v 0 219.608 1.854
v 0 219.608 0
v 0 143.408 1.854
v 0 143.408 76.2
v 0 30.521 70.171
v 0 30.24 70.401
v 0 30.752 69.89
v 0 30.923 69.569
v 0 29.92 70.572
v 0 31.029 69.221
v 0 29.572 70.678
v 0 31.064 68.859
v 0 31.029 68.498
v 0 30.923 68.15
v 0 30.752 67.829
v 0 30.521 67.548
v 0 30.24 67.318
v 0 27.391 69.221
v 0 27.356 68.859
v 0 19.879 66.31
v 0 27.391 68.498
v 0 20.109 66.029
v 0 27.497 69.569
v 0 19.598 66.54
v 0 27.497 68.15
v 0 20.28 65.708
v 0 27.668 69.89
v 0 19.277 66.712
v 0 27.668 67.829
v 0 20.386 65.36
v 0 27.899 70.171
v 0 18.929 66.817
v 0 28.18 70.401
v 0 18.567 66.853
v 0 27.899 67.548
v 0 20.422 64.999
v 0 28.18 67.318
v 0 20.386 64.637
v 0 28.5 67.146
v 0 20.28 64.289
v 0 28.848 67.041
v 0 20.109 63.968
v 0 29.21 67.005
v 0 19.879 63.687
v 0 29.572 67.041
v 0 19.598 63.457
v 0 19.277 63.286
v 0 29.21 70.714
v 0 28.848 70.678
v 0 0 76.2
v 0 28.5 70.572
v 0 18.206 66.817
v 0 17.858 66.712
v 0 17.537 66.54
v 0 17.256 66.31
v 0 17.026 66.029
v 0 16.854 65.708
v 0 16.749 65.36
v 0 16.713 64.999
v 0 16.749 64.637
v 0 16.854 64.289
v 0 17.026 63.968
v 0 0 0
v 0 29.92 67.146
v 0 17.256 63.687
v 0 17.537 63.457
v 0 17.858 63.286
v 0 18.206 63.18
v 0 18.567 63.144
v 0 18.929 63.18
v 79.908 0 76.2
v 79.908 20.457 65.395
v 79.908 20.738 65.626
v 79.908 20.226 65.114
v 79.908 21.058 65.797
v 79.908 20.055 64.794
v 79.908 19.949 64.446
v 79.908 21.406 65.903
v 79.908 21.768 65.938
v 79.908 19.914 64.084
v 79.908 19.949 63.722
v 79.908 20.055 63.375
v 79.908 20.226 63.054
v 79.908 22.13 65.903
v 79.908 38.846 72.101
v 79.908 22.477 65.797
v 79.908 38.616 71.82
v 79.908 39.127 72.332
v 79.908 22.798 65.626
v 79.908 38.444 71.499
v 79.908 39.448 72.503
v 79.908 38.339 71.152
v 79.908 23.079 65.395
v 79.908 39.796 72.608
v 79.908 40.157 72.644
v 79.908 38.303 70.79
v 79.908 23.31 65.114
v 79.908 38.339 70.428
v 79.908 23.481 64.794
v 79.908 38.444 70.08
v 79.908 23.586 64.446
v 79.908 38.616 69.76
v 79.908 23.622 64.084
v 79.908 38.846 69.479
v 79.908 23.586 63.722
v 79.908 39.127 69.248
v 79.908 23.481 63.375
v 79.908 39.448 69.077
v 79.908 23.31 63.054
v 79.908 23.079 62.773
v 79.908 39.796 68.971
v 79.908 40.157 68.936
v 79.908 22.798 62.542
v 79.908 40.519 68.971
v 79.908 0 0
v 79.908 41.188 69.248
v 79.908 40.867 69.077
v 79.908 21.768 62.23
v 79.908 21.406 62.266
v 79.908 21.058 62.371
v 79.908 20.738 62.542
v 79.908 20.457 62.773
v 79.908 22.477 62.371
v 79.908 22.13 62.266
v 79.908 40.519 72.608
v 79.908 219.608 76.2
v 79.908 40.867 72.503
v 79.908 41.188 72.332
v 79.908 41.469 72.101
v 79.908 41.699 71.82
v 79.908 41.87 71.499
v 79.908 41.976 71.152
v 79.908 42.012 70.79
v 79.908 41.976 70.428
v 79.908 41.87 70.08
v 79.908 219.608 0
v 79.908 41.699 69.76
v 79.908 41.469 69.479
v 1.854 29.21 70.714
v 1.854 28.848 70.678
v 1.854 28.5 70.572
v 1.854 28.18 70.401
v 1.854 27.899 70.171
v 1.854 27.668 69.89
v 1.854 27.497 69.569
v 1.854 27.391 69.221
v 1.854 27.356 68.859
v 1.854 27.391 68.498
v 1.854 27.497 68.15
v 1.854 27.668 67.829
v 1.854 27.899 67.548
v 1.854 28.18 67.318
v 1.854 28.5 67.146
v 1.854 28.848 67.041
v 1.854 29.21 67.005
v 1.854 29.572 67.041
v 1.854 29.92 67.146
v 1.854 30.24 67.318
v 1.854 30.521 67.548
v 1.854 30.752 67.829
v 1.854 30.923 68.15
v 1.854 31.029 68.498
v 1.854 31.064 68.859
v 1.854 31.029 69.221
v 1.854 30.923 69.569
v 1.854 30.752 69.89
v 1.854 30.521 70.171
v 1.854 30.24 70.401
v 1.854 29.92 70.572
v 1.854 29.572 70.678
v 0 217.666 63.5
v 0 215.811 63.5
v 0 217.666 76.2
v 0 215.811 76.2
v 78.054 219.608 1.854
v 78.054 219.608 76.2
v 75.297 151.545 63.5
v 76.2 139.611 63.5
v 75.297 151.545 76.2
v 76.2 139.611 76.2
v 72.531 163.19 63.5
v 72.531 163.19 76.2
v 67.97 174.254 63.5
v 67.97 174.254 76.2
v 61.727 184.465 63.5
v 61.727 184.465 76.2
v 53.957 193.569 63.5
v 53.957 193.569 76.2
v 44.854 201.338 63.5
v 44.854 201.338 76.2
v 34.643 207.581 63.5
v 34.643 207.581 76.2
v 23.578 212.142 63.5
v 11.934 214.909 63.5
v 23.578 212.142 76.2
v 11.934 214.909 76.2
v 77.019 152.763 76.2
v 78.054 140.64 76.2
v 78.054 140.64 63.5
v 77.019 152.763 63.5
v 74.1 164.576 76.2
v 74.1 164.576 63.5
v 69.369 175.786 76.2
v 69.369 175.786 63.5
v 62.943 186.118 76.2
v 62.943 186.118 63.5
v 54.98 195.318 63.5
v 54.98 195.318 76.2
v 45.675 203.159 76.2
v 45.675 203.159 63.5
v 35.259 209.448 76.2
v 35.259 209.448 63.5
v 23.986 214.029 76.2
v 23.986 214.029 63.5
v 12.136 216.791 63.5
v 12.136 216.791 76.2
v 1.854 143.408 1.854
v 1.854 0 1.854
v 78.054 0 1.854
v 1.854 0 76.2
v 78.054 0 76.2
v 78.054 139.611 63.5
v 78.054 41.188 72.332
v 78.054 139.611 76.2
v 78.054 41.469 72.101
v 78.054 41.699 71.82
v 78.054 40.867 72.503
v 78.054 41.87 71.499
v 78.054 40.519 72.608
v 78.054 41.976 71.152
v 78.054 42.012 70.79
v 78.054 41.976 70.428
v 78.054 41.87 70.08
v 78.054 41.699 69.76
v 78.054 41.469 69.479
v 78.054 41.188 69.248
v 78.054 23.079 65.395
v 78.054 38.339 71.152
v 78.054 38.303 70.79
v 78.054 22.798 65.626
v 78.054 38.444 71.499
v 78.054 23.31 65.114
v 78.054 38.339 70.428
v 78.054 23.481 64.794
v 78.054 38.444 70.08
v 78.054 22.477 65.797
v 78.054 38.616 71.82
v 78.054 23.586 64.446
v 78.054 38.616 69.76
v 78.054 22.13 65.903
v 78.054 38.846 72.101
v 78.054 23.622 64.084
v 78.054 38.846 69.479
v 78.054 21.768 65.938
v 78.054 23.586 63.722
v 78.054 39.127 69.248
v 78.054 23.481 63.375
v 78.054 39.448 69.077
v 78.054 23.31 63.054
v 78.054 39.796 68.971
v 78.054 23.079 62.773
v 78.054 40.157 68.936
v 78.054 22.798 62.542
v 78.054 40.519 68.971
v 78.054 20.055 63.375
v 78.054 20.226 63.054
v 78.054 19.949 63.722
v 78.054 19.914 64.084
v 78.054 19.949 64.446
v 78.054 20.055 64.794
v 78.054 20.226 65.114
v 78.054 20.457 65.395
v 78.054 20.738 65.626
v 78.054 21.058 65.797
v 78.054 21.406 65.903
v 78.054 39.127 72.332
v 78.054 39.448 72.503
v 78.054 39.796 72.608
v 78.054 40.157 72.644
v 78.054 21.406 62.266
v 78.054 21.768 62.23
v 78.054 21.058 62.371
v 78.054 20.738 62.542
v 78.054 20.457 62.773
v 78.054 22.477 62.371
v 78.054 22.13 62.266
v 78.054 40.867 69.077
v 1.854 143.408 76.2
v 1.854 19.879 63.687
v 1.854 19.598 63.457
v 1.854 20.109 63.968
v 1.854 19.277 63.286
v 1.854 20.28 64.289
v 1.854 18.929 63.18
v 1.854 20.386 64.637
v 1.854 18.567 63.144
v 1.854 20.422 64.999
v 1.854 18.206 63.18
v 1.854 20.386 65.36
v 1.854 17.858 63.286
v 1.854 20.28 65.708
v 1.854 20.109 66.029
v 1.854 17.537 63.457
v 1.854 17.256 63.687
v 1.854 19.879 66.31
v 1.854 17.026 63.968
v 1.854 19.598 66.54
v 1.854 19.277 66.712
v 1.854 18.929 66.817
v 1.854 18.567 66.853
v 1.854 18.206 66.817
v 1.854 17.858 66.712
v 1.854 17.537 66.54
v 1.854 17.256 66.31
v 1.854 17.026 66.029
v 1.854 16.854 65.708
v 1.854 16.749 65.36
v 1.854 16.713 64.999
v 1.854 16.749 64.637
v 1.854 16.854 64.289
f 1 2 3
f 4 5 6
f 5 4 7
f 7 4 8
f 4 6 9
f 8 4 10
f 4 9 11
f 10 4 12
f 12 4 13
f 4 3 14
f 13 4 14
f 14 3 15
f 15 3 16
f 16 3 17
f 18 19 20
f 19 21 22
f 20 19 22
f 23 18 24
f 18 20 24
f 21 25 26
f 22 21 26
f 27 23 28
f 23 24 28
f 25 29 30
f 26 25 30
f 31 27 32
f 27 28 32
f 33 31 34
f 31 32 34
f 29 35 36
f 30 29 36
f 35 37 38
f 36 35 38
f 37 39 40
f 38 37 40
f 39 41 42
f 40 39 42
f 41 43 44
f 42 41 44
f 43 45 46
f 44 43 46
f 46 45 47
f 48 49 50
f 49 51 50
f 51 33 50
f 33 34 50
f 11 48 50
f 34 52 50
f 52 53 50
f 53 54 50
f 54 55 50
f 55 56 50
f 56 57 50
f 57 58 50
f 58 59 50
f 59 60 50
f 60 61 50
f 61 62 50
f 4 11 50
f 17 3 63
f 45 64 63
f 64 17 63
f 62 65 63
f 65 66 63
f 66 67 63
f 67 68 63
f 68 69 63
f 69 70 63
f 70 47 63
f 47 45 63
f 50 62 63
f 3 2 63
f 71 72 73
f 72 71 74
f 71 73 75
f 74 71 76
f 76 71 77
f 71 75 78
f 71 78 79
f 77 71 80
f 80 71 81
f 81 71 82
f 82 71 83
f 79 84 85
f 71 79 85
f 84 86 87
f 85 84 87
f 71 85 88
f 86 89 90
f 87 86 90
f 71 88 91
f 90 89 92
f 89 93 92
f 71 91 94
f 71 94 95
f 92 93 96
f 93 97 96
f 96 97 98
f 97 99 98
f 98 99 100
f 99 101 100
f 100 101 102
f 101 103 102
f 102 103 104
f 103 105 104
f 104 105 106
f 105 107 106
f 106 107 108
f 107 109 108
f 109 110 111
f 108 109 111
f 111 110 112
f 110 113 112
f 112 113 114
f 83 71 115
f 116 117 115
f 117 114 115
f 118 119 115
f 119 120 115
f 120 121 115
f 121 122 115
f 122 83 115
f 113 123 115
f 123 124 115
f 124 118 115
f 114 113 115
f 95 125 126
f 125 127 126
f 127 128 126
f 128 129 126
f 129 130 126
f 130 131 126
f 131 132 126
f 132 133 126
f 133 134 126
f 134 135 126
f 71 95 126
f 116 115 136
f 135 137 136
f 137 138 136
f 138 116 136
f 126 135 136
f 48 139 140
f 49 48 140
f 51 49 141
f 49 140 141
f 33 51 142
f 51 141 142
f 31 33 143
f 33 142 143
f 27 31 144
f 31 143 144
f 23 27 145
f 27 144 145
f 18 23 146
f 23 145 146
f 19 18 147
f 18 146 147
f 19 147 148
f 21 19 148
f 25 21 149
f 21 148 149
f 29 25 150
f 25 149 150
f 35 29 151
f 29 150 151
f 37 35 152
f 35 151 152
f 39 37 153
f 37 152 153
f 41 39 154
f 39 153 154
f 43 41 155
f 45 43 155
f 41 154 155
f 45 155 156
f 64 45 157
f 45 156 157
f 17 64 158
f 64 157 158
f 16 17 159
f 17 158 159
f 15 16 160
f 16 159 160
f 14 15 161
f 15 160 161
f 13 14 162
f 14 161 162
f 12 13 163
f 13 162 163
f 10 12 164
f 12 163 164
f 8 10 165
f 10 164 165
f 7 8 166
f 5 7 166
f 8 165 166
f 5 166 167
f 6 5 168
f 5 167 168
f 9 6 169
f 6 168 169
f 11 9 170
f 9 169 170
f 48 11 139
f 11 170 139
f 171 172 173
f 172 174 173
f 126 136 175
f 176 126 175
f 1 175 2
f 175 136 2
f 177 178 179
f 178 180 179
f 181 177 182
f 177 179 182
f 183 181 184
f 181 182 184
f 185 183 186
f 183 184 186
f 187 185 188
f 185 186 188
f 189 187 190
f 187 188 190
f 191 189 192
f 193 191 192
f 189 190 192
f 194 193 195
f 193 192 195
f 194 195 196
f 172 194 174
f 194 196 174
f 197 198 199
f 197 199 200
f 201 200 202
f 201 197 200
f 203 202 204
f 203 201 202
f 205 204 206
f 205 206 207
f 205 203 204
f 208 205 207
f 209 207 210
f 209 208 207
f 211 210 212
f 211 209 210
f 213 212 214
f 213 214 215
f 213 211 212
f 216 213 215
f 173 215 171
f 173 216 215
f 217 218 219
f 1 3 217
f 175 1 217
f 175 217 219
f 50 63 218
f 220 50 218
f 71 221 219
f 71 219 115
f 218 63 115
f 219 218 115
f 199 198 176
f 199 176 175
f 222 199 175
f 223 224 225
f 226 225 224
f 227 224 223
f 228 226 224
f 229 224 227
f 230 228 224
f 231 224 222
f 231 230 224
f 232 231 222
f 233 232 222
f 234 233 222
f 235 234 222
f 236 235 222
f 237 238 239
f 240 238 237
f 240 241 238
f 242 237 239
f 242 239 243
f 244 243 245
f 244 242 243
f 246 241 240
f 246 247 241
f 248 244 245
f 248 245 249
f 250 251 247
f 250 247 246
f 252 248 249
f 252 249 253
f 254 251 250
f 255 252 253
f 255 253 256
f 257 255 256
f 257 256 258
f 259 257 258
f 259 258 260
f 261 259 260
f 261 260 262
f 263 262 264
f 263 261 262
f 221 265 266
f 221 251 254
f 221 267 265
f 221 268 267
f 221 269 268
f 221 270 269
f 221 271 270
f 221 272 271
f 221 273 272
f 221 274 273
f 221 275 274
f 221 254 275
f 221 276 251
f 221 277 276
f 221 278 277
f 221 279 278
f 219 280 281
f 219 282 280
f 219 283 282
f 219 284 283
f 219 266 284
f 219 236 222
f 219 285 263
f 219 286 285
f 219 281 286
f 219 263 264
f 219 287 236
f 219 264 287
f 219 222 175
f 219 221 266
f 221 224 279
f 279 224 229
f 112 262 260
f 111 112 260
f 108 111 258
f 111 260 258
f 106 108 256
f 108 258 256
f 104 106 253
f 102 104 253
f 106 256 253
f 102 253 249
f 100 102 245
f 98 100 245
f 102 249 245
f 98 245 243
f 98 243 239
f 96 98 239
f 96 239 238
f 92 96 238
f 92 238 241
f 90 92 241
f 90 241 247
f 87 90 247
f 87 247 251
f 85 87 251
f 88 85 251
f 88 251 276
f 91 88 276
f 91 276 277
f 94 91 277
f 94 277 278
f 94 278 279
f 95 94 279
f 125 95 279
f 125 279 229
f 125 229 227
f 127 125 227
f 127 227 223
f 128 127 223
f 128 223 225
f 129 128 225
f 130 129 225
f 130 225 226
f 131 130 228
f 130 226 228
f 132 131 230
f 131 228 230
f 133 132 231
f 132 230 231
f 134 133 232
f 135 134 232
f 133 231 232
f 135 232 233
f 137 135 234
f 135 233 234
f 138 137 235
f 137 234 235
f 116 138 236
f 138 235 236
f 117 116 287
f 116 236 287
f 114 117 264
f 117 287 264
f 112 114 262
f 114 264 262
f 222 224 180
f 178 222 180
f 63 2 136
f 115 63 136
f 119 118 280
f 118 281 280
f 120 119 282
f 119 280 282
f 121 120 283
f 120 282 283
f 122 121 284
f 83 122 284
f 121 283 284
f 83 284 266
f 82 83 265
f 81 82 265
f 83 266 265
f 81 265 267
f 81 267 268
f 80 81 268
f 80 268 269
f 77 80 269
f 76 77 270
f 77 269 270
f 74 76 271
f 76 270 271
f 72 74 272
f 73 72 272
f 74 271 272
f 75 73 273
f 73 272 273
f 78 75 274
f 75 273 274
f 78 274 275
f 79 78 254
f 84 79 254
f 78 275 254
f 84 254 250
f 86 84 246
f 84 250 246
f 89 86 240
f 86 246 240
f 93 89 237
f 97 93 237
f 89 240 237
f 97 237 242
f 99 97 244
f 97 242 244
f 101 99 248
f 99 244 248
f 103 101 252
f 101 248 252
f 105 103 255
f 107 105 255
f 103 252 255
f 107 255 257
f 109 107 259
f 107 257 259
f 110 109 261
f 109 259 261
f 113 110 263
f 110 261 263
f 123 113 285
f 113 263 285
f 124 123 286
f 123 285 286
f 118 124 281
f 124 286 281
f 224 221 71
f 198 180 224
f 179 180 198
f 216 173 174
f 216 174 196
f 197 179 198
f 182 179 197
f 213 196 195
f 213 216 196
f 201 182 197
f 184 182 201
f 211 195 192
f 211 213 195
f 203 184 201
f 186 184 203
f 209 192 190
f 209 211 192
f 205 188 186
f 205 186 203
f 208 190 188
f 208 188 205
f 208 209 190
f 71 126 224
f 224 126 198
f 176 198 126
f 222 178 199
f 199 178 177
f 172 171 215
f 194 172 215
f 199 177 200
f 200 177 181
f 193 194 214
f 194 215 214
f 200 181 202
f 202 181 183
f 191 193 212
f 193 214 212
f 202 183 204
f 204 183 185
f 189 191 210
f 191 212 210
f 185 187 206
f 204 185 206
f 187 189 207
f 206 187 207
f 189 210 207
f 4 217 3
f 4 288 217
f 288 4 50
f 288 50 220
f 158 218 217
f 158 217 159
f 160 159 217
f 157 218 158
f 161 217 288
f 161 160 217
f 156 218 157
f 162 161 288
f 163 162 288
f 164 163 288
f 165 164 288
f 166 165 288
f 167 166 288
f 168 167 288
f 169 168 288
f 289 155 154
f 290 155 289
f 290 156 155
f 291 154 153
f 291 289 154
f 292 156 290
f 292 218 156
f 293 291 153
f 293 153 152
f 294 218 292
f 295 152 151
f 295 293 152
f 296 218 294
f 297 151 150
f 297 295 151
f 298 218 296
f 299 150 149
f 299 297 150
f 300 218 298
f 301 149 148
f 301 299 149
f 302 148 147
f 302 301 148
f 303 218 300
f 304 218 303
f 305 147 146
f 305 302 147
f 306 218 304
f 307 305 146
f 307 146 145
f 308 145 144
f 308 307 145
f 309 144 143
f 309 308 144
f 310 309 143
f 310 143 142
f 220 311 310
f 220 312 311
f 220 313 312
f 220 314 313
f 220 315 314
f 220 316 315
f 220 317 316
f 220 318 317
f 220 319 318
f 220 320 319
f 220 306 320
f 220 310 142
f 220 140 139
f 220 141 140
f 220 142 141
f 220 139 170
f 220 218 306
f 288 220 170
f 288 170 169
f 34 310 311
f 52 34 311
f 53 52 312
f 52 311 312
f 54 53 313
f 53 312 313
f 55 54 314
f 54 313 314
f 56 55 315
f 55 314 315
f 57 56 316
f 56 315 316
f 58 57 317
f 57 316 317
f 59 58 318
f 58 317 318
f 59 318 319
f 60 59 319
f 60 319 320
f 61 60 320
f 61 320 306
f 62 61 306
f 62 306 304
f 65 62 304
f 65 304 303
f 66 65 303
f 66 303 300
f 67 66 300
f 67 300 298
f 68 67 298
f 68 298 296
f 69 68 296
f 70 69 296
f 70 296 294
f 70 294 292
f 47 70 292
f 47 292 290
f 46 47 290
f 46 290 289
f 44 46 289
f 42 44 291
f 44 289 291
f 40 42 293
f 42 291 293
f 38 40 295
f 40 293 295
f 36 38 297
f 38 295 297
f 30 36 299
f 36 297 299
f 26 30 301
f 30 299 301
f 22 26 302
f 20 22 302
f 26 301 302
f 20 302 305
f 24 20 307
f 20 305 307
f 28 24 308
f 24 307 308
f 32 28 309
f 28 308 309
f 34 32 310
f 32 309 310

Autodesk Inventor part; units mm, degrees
ref_plane "YZ Plane" through (0, 0, 0) normal (1, 0, 0) x (0, 1, 0)
ref_plane "XZ Plane" through (0, 0, 0) normal (0, 1, 0) x (-1, 0, 0)
ref_plane "XY Plane" through (0, 0, 0) normal (0, 0, 1) x (1, 0, 0)
sketch "Sketch1" plane through (0, 0, 0) normal (0, 0, 1) x (1, 0, 0)
  line L0 (0, 0) -> (79.9084, 0)
  line L1 (79.9084, 0) -> (79.9084, 219.6084)
  line L2 (79.9084, 219.6084) -> (0, 219.6084)
  line L3 (0, 219.6084) -> (0, 0)
  dimension "d0" = 79.9084
  dimension "d1" = 219.6084
extrude "Extrusion1" add sketch "Sketch1" along normal blind 76.2
sketch "Sketch2" plane through (0, 0, 0) normal (0, -1, 0) x (1, 0, 0)
  line L0 (79.9084, 0) -> (79.9084, 76.2) projected
  line L1 (0, 0) -> (79.9084, 0) projected
  line L2 (0, 76.2) -> (79.9084, 76.2) projected
  line L3 (78.0542, 1.8542) -> (1.8542, 1.8542)
  line L4 (1.8542, 1.8542) -> (1.8542, 76.2)
  line L5 (1.8542, 76.2) -> (78.0542, 76.2)
  line L6 (78.0542, 76.2) -> (78.0542, 1.8542)
  dimension "d4" = 1.8542
  dimension "d5" = 1.8542
  dimension "d6" = 76.2
extrude "Extrusion2" cut sketch "Sketch2" against normal blind 228.6
sketch "Sketch3" plane through (0, 0, 76.2) normal (0, 0, 1) x (1, 0, 0)
  line L0 (1.8542, 0) -> (1.8542, 219.6084) projected
  line L1 (0, 219.6084) -> (1.8542, 219.6084)
  line L2 (1.8542, 219.6084) -> (1.8542, 143.4084)
  line L3 (1.8542, 143.4084) -> (0, 143.4084)
  line L4 (0, 143.4084) -> (0, 219.6084)
  point P0 (0, 0)
  dimension "d9" = 76.2
extrude "Extrusion3" cut sketch "Sketch3" against normal blind 74.3458
sketch "Sketch9" plane through (0, 0, 76.2) normal (0, 0, 1) x (1, 0, 0)
  line L0 (78.0542, 219.6084) -> (78.0542, 0) projected
  line L1 (0, 143.4084) -> (0, 219.6084) projected
  arc A0 (78.0542, 139.6114) -> (0, 217.6656) centre (0.5141, 140.1255) ccw
  line L2 (0, 217.6656) -> (78.0542, 139.6114) construction
  line L3 (0, 217.6656) -> (110.3853, 217.6656) construction
  line L4 (78.0542, 139.6114) -> (76.2, 139.6114)
  line L5 (0, 217.6656) -> (0, 215.8114)
  arc A1 (76.2, 139.6114) -> (0, 215.8114) centre (0.257, 139.8685) ccw
  point P0 (0, 0)
  dimension "d22" = 45
  dimension "d23" = 1.8542
  dimension "d24" = 1.8542
extrude "Extrusion7" add sketch "Sketch9" against normal blind 12.7
sketch "Sketch10" plane through (0, 0, 0) normal (-1, 0, 0) x (0, 0, 1)
  line L0 (0, 0) -> (76.2, 0) projected
  line L1 (76.2, 143.4084) -> (76.2, 0) projected
  point P0 (64.9986, 18.5674)
  point P1 (68.8594, 29.21)
  dimension "d27" = 18.5674
  dimension "d28" = 11.2014
  dimension "d29" = 7.3406
  dimension "d30" = 29.21
hole "Hole1" at (0, 29.21, 68.8594) at (0, 18.5674, 64.9986) direction (1, 0, 0) diameter 3.7084 depth 1.8542
sketch "Sketch11" plane through (79.9084, 0, 0) normal (1, 0, 0) x (0, 0, -1)
  line L0 (0, 0) -> (-76.2, 0) projected
  line L1 (-76.2, 0) -> (-76.2, 219.6084) projected
  point P0 (-70.7898, 40.1574)
  point P1 (-64.0842, 21.7678)
  dimension "d38" = 40.1574
  dimension "d39" = 5.4102
  dimension "d40" = 12.1158
  dimension "d41" = 21.7678
hole "Hole2" at (79.9084, 40.1574, 70.7898) at (79.9084, 21.7678, 64.0842) direction (-1, 0, 0) diameter 3.7084 depth 1.8542
properties part number "Sorter" material "Aluminum 6061"
